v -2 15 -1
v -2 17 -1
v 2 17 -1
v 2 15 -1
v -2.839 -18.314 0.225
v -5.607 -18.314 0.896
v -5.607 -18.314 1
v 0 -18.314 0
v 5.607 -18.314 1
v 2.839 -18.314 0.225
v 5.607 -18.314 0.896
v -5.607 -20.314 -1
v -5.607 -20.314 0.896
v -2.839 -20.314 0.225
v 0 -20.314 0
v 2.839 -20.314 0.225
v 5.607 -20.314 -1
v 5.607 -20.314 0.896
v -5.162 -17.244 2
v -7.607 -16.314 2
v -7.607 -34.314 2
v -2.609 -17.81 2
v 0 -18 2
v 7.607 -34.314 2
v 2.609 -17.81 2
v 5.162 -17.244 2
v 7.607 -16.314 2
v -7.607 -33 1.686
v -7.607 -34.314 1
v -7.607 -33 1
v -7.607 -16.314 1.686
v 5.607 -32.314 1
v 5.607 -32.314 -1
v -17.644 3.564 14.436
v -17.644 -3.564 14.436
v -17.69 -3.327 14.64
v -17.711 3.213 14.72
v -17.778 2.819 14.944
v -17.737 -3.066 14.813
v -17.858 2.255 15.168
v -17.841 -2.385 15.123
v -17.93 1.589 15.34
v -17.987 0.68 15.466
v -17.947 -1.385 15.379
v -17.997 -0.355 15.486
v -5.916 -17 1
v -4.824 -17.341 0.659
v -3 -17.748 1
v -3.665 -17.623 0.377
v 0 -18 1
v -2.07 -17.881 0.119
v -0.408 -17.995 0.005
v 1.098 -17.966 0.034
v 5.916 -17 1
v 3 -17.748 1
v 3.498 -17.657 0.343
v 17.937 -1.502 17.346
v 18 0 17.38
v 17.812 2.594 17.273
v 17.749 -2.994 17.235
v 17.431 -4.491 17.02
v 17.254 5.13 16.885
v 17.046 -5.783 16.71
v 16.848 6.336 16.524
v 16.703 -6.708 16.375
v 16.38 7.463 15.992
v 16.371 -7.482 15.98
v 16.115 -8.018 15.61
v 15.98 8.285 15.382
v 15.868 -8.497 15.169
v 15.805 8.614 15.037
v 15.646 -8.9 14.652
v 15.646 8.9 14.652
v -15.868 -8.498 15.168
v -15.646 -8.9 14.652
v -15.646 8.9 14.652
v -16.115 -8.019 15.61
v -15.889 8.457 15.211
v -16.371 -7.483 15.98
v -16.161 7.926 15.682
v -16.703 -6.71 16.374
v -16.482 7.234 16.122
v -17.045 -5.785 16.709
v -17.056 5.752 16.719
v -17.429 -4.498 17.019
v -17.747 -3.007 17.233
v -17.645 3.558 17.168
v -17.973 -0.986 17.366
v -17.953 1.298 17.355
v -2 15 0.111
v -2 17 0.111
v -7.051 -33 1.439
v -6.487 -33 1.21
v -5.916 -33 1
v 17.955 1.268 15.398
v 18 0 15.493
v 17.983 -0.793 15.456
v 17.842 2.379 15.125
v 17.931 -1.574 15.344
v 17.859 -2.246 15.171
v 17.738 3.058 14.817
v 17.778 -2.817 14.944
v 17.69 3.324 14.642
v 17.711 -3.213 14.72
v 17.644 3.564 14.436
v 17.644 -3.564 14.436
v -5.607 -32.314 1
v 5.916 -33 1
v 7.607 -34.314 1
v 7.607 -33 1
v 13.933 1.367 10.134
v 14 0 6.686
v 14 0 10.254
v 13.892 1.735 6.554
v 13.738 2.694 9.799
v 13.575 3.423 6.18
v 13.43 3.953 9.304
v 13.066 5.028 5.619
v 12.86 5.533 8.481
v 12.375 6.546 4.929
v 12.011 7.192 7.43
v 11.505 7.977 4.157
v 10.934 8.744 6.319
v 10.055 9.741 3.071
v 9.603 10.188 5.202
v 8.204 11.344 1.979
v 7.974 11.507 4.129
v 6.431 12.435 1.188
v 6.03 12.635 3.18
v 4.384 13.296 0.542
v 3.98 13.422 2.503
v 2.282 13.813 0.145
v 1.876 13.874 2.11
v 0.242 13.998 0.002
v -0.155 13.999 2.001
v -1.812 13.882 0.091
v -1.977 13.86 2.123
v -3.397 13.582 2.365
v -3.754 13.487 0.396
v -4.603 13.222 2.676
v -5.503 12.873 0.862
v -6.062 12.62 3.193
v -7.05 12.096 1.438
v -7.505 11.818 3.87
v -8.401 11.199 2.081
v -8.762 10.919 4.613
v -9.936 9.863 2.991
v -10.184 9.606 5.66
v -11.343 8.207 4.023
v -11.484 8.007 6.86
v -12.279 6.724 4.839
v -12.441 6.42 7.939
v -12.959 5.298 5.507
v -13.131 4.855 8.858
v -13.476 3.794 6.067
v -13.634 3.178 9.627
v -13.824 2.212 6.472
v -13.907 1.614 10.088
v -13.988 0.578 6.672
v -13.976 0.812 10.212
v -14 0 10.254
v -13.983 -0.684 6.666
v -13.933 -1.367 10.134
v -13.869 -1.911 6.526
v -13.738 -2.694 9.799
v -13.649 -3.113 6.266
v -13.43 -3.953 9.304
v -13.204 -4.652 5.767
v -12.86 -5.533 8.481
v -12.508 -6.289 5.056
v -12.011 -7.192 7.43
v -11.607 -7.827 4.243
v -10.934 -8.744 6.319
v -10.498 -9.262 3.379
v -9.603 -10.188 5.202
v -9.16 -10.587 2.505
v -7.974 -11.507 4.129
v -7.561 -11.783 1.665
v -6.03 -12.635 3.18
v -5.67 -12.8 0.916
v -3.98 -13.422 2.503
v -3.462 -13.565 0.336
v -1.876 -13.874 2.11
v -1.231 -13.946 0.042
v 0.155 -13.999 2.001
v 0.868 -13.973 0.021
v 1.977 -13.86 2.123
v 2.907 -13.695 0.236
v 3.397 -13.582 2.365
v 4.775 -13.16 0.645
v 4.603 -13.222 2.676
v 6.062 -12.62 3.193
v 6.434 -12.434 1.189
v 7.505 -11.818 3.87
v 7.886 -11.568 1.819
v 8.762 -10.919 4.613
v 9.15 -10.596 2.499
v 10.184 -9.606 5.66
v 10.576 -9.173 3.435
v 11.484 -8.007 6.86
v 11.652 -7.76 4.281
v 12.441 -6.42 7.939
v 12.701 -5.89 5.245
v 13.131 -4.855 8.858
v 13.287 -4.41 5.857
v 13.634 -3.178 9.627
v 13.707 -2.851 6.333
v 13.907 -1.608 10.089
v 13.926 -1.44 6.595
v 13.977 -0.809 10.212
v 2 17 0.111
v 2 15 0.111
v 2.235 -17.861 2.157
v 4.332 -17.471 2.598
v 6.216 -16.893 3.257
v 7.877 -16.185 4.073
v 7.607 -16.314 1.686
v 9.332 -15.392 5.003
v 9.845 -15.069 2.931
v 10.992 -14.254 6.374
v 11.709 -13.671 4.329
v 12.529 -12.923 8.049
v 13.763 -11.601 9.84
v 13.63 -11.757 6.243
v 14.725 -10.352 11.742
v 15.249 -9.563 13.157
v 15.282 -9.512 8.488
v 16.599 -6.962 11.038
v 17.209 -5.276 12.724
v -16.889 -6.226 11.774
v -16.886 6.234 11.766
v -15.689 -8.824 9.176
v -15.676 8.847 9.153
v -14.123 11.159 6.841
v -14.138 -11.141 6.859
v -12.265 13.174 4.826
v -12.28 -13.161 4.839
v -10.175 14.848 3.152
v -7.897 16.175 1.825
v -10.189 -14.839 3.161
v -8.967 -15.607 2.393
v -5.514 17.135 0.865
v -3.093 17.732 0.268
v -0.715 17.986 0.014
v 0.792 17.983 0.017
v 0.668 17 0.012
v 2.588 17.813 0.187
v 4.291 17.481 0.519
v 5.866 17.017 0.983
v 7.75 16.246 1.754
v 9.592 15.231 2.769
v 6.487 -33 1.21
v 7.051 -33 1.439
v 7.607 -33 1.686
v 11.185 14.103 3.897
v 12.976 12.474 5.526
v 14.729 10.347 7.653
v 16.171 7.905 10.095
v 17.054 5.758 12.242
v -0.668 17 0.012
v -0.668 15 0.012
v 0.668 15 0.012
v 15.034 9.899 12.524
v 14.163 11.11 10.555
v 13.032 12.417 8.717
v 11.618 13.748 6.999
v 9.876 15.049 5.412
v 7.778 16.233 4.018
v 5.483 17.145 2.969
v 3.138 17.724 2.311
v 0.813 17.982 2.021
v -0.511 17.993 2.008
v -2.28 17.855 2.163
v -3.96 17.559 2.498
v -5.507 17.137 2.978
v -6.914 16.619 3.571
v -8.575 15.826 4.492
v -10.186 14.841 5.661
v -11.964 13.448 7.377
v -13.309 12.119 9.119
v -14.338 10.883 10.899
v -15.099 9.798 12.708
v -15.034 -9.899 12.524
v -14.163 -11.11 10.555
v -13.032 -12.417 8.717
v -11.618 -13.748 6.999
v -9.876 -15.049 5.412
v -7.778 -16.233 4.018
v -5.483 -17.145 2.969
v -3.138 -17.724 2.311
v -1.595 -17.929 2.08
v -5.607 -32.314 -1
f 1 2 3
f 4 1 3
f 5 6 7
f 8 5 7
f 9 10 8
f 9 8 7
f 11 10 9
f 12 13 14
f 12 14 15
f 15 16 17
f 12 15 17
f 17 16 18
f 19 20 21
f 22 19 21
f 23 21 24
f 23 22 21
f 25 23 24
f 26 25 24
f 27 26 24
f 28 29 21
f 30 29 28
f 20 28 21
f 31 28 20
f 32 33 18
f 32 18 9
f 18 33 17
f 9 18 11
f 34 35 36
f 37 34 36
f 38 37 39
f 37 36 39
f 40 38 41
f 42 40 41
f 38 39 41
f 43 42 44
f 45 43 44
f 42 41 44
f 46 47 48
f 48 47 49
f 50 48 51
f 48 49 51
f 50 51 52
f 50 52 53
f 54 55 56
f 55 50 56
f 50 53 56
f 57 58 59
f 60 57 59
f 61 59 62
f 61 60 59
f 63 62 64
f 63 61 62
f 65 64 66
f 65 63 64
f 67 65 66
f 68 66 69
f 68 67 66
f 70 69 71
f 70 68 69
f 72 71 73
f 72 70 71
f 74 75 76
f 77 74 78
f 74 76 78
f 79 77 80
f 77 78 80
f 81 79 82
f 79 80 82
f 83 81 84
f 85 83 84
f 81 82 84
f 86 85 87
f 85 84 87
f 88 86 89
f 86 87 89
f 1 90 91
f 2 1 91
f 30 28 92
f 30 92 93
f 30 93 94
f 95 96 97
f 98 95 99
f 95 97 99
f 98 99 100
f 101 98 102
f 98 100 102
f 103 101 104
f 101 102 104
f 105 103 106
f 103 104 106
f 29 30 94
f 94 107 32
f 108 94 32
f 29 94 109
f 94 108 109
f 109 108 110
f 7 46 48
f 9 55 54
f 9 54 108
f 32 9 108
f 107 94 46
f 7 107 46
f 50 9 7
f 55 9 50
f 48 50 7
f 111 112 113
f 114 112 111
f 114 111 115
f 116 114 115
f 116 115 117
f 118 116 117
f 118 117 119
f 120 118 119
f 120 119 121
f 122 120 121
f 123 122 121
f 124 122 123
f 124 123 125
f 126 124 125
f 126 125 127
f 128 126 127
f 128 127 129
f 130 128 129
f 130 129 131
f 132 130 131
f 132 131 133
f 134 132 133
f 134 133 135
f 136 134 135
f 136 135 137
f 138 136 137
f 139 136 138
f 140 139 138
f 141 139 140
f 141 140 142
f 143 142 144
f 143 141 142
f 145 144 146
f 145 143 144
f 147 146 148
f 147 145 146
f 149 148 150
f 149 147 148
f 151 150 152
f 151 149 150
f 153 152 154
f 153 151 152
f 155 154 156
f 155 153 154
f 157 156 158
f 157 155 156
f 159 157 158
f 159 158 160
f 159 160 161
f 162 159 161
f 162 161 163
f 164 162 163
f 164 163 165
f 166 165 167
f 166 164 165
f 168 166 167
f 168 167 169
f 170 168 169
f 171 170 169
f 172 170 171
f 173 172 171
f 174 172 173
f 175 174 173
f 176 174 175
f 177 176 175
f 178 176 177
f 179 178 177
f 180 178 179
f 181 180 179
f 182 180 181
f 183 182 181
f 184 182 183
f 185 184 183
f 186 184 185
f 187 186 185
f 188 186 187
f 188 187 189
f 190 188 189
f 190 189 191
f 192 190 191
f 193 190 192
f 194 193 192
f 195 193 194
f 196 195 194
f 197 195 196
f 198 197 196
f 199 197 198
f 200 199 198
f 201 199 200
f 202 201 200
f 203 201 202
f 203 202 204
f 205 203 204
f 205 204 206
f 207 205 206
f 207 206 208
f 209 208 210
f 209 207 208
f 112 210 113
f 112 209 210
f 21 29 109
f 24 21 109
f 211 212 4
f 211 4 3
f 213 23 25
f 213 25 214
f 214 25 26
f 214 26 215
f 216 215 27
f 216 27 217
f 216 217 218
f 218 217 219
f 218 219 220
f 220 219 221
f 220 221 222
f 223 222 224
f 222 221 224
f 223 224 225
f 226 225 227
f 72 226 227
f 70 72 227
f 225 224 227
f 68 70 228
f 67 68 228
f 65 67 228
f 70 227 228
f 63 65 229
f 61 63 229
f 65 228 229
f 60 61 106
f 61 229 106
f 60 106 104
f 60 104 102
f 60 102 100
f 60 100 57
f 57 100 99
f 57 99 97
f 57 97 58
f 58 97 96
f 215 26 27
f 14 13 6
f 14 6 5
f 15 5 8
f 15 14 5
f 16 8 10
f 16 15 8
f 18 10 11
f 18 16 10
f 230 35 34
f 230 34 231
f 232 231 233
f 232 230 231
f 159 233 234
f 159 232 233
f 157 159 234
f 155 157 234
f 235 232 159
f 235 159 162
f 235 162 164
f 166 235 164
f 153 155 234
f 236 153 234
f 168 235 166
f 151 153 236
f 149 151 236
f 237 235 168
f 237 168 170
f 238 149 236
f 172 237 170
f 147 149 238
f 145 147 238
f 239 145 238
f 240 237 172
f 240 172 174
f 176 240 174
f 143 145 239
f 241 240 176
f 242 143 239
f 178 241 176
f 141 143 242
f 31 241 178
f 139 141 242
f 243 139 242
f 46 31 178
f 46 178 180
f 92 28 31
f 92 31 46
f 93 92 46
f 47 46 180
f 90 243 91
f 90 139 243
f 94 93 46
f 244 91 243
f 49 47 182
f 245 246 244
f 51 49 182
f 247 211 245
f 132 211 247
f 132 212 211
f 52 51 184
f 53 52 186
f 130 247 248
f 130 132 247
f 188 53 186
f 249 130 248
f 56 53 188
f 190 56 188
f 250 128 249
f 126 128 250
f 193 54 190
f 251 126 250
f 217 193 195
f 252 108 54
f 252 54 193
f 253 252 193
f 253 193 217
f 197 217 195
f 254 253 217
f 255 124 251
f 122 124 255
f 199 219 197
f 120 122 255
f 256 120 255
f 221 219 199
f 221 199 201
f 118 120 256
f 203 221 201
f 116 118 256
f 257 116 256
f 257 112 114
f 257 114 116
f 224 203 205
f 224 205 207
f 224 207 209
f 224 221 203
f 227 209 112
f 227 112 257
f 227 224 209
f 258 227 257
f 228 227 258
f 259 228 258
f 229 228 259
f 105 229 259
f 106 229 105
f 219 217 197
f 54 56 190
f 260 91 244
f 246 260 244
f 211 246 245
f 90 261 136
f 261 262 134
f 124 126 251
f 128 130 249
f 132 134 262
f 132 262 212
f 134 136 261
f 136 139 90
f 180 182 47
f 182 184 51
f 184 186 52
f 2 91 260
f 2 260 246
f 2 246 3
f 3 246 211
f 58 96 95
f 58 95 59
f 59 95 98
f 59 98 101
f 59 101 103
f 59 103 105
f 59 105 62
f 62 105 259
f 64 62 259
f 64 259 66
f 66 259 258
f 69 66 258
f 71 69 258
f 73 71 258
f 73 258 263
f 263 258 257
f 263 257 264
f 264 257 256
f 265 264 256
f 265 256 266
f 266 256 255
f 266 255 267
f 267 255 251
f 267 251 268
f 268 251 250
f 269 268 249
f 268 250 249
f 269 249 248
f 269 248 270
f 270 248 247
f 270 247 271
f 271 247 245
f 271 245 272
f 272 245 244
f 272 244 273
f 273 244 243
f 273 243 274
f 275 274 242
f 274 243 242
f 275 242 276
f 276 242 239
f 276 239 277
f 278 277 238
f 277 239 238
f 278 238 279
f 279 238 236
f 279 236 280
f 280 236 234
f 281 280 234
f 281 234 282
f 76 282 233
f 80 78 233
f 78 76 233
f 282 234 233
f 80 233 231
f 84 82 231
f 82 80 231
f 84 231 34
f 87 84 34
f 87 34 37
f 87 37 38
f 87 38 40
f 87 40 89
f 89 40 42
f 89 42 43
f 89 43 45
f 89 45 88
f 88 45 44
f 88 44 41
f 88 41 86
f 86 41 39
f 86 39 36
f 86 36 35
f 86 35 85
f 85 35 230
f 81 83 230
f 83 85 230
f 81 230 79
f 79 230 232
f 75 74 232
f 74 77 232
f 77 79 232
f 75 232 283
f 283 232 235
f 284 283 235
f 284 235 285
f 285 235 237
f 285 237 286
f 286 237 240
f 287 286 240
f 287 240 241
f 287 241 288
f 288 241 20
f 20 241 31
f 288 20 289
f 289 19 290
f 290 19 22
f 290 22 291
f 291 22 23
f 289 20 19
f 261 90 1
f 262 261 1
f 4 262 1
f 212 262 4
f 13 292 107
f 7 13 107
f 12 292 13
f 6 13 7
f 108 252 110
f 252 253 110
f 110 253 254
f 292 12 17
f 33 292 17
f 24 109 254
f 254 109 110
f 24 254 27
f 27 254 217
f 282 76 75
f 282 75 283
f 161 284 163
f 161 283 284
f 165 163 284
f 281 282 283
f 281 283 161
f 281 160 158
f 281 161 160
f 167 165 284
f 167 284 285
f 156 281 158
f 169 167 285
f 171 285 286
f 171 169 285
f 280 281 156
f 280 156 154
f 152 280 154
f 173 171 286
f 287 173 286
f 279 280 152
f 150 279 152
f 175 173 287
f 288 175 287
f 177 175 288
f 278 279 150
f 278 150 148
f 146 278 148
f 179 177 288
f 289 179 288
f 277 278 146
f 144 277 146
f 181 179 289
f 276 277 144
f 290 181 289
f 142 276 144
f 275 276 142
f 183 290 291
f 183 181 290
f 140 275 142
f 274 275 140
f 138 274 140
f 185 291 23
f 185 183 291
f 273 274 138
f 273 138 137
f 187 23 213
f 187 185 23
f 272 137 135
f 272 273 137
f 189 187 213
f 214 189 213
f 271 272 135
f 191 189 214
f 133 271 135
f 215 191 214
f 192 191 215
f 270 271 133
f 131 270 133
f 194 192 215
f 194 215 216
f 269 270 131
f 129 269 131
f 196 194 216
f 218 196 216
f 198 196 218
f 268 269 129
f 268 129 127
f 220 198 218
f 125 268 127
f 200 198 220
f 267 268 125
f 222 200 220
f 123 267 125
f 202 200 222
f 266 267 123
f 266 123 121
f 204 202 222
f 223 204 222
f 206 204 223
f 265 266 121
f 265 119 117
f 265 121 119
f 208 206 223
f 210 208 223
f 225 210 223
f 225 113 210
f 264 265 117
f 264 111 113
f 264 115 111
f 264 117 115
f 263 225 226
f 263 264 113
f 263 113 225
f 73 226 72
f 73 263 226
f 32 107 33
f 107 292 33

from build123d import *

# Parameters (mm, degrees)
SKETCH_R             = 18
PAD_DEPTH            = 36
SKETCH001_R          = 14
POCKET_DEPTH         = 36.001
SKETCH004_W          = 15.214258
SKETCH004_H          = 18
PAD001_DEPTH         = 1
SKETCH005_W          = 11.214258
SKETCH005_H          = 14
PAD002_DEPTH         = 2
POCKET001_DEPTH      = 33
POCKET002_DEPTH      = 18.001
POCKET002_DEPTH_BACK = -34.31454
SKETCH007_W          = 4
SKETCH007_H          = 2
PAD003_DEPTH         = 1
SKETCH008_W          = 11.214258
SKETCH008_H          = 12
PAD004_DEPTH         = 3


with BuildPart() as part:
    # Sketch → Pad (new body)
    with BuildSketch(Plane.XY):
        Circle(SKETCH_R)
    extrude(amount=PAD_DEPTH)

    # Sketch001 → Pocket (cut, through all)
    with BuildSketch(Plane.XY):
        Circle(SKETCH001_R)
    extrude(amount=POCKET_DEPTH, mode=Mode.SUBTRACT)

    # Sketch004 → Pad001 (join)
    with BuildSketch(Plane.XY.offset(1)):
        with Locations((0, -25.31354)):
            Rectangle(SKETCH004_W, SKETCH004_H)
    extrude(amount=PAD001_DEPTH)

    # Sketch005 → Pad002 (join)
    with BuildSketch(Plane.XY):
        with Locations((0, -25.31354)):
            Rectangle(SKETCH005_W, SKETCH005_H)
    extrude(amount=PAD002_DEPTH)

    # Sketch002 → Pocket001 (cut, symmetric)
    with BuildSketch(Plane.XZ):
        with BuildLine():
            Line((-40, -10), (40, -10))
            Line((40, -10), (40, 18))
            Line((40, 18), (22, 18))
            ThreePointArc((22, 18), (19.18561, 16.995366), (17.643564, 14.435644))
            ThreePointArc((-17.643564, 14.435644), (0, 0), (17.643564, 14.435644))
            ThreePointArc((-17.643564, 14.435644), (-19.18561, 16.995366), (-22, 18))
            Line((-22, 18), (-40, 18))
            Line((-40, 18), (-40, -10))
        make_face()
    extrude(amount=POCKET001_DEPTH, both=True, mode=Mode.SUBTRACT)

    # Sketch003 → Pocket002 (cut, two sides)
    with BuildSketch(Plane.XZ) as pocket002_sk:
        with BuildLine():
            Line((-30, 36), (30, 36))
            Line((30, 36), (30, 18))
            Line((30, 18), (20.4369, 18))
            ThreePointArc((20.4369, 18), (17.514273, 17.079952), (15.645716, 14.651632))
            ThreePointArc((-15.645716, 14.651632), (0, 2), (15.645716, 14.651632))
            ThreePointArc((-15.645716, 14.651632), (-17.514273, 17.079952), (-20.4369, 18))
            Line((-20.4369, 18), (-30, 18))
            Line((-30, 18), (-30, 36))
        make_face()
    extrude(amount=-POCKET002_DEPTH, mode=Mode.SUBTRACT)
    extrude(pocket002_sk.sketch, amount=-POCKET002_DEPTH_BACK, mode=Mode.SUBTRACT)

    # Sketch007 → Pad003 (join, symmetric)
    with BuildSketch(Plane.XY):
        with Locations((0, 16)):
            Rectangle(SKETCH007_W, SKETCH007_H)
    extrude(amount=PAD003_DEPTH, both=True)

    # Sketch008 → Pad004 (join)
    with BuildSketch(Plane.XY.offset(2)):
        with Locations((0, -26.31354)):
            Rectangle(SKETCH008_W, SKETCH008_H)
    extrude(amount=-PAD004_DEPTH)


solid = part.part
